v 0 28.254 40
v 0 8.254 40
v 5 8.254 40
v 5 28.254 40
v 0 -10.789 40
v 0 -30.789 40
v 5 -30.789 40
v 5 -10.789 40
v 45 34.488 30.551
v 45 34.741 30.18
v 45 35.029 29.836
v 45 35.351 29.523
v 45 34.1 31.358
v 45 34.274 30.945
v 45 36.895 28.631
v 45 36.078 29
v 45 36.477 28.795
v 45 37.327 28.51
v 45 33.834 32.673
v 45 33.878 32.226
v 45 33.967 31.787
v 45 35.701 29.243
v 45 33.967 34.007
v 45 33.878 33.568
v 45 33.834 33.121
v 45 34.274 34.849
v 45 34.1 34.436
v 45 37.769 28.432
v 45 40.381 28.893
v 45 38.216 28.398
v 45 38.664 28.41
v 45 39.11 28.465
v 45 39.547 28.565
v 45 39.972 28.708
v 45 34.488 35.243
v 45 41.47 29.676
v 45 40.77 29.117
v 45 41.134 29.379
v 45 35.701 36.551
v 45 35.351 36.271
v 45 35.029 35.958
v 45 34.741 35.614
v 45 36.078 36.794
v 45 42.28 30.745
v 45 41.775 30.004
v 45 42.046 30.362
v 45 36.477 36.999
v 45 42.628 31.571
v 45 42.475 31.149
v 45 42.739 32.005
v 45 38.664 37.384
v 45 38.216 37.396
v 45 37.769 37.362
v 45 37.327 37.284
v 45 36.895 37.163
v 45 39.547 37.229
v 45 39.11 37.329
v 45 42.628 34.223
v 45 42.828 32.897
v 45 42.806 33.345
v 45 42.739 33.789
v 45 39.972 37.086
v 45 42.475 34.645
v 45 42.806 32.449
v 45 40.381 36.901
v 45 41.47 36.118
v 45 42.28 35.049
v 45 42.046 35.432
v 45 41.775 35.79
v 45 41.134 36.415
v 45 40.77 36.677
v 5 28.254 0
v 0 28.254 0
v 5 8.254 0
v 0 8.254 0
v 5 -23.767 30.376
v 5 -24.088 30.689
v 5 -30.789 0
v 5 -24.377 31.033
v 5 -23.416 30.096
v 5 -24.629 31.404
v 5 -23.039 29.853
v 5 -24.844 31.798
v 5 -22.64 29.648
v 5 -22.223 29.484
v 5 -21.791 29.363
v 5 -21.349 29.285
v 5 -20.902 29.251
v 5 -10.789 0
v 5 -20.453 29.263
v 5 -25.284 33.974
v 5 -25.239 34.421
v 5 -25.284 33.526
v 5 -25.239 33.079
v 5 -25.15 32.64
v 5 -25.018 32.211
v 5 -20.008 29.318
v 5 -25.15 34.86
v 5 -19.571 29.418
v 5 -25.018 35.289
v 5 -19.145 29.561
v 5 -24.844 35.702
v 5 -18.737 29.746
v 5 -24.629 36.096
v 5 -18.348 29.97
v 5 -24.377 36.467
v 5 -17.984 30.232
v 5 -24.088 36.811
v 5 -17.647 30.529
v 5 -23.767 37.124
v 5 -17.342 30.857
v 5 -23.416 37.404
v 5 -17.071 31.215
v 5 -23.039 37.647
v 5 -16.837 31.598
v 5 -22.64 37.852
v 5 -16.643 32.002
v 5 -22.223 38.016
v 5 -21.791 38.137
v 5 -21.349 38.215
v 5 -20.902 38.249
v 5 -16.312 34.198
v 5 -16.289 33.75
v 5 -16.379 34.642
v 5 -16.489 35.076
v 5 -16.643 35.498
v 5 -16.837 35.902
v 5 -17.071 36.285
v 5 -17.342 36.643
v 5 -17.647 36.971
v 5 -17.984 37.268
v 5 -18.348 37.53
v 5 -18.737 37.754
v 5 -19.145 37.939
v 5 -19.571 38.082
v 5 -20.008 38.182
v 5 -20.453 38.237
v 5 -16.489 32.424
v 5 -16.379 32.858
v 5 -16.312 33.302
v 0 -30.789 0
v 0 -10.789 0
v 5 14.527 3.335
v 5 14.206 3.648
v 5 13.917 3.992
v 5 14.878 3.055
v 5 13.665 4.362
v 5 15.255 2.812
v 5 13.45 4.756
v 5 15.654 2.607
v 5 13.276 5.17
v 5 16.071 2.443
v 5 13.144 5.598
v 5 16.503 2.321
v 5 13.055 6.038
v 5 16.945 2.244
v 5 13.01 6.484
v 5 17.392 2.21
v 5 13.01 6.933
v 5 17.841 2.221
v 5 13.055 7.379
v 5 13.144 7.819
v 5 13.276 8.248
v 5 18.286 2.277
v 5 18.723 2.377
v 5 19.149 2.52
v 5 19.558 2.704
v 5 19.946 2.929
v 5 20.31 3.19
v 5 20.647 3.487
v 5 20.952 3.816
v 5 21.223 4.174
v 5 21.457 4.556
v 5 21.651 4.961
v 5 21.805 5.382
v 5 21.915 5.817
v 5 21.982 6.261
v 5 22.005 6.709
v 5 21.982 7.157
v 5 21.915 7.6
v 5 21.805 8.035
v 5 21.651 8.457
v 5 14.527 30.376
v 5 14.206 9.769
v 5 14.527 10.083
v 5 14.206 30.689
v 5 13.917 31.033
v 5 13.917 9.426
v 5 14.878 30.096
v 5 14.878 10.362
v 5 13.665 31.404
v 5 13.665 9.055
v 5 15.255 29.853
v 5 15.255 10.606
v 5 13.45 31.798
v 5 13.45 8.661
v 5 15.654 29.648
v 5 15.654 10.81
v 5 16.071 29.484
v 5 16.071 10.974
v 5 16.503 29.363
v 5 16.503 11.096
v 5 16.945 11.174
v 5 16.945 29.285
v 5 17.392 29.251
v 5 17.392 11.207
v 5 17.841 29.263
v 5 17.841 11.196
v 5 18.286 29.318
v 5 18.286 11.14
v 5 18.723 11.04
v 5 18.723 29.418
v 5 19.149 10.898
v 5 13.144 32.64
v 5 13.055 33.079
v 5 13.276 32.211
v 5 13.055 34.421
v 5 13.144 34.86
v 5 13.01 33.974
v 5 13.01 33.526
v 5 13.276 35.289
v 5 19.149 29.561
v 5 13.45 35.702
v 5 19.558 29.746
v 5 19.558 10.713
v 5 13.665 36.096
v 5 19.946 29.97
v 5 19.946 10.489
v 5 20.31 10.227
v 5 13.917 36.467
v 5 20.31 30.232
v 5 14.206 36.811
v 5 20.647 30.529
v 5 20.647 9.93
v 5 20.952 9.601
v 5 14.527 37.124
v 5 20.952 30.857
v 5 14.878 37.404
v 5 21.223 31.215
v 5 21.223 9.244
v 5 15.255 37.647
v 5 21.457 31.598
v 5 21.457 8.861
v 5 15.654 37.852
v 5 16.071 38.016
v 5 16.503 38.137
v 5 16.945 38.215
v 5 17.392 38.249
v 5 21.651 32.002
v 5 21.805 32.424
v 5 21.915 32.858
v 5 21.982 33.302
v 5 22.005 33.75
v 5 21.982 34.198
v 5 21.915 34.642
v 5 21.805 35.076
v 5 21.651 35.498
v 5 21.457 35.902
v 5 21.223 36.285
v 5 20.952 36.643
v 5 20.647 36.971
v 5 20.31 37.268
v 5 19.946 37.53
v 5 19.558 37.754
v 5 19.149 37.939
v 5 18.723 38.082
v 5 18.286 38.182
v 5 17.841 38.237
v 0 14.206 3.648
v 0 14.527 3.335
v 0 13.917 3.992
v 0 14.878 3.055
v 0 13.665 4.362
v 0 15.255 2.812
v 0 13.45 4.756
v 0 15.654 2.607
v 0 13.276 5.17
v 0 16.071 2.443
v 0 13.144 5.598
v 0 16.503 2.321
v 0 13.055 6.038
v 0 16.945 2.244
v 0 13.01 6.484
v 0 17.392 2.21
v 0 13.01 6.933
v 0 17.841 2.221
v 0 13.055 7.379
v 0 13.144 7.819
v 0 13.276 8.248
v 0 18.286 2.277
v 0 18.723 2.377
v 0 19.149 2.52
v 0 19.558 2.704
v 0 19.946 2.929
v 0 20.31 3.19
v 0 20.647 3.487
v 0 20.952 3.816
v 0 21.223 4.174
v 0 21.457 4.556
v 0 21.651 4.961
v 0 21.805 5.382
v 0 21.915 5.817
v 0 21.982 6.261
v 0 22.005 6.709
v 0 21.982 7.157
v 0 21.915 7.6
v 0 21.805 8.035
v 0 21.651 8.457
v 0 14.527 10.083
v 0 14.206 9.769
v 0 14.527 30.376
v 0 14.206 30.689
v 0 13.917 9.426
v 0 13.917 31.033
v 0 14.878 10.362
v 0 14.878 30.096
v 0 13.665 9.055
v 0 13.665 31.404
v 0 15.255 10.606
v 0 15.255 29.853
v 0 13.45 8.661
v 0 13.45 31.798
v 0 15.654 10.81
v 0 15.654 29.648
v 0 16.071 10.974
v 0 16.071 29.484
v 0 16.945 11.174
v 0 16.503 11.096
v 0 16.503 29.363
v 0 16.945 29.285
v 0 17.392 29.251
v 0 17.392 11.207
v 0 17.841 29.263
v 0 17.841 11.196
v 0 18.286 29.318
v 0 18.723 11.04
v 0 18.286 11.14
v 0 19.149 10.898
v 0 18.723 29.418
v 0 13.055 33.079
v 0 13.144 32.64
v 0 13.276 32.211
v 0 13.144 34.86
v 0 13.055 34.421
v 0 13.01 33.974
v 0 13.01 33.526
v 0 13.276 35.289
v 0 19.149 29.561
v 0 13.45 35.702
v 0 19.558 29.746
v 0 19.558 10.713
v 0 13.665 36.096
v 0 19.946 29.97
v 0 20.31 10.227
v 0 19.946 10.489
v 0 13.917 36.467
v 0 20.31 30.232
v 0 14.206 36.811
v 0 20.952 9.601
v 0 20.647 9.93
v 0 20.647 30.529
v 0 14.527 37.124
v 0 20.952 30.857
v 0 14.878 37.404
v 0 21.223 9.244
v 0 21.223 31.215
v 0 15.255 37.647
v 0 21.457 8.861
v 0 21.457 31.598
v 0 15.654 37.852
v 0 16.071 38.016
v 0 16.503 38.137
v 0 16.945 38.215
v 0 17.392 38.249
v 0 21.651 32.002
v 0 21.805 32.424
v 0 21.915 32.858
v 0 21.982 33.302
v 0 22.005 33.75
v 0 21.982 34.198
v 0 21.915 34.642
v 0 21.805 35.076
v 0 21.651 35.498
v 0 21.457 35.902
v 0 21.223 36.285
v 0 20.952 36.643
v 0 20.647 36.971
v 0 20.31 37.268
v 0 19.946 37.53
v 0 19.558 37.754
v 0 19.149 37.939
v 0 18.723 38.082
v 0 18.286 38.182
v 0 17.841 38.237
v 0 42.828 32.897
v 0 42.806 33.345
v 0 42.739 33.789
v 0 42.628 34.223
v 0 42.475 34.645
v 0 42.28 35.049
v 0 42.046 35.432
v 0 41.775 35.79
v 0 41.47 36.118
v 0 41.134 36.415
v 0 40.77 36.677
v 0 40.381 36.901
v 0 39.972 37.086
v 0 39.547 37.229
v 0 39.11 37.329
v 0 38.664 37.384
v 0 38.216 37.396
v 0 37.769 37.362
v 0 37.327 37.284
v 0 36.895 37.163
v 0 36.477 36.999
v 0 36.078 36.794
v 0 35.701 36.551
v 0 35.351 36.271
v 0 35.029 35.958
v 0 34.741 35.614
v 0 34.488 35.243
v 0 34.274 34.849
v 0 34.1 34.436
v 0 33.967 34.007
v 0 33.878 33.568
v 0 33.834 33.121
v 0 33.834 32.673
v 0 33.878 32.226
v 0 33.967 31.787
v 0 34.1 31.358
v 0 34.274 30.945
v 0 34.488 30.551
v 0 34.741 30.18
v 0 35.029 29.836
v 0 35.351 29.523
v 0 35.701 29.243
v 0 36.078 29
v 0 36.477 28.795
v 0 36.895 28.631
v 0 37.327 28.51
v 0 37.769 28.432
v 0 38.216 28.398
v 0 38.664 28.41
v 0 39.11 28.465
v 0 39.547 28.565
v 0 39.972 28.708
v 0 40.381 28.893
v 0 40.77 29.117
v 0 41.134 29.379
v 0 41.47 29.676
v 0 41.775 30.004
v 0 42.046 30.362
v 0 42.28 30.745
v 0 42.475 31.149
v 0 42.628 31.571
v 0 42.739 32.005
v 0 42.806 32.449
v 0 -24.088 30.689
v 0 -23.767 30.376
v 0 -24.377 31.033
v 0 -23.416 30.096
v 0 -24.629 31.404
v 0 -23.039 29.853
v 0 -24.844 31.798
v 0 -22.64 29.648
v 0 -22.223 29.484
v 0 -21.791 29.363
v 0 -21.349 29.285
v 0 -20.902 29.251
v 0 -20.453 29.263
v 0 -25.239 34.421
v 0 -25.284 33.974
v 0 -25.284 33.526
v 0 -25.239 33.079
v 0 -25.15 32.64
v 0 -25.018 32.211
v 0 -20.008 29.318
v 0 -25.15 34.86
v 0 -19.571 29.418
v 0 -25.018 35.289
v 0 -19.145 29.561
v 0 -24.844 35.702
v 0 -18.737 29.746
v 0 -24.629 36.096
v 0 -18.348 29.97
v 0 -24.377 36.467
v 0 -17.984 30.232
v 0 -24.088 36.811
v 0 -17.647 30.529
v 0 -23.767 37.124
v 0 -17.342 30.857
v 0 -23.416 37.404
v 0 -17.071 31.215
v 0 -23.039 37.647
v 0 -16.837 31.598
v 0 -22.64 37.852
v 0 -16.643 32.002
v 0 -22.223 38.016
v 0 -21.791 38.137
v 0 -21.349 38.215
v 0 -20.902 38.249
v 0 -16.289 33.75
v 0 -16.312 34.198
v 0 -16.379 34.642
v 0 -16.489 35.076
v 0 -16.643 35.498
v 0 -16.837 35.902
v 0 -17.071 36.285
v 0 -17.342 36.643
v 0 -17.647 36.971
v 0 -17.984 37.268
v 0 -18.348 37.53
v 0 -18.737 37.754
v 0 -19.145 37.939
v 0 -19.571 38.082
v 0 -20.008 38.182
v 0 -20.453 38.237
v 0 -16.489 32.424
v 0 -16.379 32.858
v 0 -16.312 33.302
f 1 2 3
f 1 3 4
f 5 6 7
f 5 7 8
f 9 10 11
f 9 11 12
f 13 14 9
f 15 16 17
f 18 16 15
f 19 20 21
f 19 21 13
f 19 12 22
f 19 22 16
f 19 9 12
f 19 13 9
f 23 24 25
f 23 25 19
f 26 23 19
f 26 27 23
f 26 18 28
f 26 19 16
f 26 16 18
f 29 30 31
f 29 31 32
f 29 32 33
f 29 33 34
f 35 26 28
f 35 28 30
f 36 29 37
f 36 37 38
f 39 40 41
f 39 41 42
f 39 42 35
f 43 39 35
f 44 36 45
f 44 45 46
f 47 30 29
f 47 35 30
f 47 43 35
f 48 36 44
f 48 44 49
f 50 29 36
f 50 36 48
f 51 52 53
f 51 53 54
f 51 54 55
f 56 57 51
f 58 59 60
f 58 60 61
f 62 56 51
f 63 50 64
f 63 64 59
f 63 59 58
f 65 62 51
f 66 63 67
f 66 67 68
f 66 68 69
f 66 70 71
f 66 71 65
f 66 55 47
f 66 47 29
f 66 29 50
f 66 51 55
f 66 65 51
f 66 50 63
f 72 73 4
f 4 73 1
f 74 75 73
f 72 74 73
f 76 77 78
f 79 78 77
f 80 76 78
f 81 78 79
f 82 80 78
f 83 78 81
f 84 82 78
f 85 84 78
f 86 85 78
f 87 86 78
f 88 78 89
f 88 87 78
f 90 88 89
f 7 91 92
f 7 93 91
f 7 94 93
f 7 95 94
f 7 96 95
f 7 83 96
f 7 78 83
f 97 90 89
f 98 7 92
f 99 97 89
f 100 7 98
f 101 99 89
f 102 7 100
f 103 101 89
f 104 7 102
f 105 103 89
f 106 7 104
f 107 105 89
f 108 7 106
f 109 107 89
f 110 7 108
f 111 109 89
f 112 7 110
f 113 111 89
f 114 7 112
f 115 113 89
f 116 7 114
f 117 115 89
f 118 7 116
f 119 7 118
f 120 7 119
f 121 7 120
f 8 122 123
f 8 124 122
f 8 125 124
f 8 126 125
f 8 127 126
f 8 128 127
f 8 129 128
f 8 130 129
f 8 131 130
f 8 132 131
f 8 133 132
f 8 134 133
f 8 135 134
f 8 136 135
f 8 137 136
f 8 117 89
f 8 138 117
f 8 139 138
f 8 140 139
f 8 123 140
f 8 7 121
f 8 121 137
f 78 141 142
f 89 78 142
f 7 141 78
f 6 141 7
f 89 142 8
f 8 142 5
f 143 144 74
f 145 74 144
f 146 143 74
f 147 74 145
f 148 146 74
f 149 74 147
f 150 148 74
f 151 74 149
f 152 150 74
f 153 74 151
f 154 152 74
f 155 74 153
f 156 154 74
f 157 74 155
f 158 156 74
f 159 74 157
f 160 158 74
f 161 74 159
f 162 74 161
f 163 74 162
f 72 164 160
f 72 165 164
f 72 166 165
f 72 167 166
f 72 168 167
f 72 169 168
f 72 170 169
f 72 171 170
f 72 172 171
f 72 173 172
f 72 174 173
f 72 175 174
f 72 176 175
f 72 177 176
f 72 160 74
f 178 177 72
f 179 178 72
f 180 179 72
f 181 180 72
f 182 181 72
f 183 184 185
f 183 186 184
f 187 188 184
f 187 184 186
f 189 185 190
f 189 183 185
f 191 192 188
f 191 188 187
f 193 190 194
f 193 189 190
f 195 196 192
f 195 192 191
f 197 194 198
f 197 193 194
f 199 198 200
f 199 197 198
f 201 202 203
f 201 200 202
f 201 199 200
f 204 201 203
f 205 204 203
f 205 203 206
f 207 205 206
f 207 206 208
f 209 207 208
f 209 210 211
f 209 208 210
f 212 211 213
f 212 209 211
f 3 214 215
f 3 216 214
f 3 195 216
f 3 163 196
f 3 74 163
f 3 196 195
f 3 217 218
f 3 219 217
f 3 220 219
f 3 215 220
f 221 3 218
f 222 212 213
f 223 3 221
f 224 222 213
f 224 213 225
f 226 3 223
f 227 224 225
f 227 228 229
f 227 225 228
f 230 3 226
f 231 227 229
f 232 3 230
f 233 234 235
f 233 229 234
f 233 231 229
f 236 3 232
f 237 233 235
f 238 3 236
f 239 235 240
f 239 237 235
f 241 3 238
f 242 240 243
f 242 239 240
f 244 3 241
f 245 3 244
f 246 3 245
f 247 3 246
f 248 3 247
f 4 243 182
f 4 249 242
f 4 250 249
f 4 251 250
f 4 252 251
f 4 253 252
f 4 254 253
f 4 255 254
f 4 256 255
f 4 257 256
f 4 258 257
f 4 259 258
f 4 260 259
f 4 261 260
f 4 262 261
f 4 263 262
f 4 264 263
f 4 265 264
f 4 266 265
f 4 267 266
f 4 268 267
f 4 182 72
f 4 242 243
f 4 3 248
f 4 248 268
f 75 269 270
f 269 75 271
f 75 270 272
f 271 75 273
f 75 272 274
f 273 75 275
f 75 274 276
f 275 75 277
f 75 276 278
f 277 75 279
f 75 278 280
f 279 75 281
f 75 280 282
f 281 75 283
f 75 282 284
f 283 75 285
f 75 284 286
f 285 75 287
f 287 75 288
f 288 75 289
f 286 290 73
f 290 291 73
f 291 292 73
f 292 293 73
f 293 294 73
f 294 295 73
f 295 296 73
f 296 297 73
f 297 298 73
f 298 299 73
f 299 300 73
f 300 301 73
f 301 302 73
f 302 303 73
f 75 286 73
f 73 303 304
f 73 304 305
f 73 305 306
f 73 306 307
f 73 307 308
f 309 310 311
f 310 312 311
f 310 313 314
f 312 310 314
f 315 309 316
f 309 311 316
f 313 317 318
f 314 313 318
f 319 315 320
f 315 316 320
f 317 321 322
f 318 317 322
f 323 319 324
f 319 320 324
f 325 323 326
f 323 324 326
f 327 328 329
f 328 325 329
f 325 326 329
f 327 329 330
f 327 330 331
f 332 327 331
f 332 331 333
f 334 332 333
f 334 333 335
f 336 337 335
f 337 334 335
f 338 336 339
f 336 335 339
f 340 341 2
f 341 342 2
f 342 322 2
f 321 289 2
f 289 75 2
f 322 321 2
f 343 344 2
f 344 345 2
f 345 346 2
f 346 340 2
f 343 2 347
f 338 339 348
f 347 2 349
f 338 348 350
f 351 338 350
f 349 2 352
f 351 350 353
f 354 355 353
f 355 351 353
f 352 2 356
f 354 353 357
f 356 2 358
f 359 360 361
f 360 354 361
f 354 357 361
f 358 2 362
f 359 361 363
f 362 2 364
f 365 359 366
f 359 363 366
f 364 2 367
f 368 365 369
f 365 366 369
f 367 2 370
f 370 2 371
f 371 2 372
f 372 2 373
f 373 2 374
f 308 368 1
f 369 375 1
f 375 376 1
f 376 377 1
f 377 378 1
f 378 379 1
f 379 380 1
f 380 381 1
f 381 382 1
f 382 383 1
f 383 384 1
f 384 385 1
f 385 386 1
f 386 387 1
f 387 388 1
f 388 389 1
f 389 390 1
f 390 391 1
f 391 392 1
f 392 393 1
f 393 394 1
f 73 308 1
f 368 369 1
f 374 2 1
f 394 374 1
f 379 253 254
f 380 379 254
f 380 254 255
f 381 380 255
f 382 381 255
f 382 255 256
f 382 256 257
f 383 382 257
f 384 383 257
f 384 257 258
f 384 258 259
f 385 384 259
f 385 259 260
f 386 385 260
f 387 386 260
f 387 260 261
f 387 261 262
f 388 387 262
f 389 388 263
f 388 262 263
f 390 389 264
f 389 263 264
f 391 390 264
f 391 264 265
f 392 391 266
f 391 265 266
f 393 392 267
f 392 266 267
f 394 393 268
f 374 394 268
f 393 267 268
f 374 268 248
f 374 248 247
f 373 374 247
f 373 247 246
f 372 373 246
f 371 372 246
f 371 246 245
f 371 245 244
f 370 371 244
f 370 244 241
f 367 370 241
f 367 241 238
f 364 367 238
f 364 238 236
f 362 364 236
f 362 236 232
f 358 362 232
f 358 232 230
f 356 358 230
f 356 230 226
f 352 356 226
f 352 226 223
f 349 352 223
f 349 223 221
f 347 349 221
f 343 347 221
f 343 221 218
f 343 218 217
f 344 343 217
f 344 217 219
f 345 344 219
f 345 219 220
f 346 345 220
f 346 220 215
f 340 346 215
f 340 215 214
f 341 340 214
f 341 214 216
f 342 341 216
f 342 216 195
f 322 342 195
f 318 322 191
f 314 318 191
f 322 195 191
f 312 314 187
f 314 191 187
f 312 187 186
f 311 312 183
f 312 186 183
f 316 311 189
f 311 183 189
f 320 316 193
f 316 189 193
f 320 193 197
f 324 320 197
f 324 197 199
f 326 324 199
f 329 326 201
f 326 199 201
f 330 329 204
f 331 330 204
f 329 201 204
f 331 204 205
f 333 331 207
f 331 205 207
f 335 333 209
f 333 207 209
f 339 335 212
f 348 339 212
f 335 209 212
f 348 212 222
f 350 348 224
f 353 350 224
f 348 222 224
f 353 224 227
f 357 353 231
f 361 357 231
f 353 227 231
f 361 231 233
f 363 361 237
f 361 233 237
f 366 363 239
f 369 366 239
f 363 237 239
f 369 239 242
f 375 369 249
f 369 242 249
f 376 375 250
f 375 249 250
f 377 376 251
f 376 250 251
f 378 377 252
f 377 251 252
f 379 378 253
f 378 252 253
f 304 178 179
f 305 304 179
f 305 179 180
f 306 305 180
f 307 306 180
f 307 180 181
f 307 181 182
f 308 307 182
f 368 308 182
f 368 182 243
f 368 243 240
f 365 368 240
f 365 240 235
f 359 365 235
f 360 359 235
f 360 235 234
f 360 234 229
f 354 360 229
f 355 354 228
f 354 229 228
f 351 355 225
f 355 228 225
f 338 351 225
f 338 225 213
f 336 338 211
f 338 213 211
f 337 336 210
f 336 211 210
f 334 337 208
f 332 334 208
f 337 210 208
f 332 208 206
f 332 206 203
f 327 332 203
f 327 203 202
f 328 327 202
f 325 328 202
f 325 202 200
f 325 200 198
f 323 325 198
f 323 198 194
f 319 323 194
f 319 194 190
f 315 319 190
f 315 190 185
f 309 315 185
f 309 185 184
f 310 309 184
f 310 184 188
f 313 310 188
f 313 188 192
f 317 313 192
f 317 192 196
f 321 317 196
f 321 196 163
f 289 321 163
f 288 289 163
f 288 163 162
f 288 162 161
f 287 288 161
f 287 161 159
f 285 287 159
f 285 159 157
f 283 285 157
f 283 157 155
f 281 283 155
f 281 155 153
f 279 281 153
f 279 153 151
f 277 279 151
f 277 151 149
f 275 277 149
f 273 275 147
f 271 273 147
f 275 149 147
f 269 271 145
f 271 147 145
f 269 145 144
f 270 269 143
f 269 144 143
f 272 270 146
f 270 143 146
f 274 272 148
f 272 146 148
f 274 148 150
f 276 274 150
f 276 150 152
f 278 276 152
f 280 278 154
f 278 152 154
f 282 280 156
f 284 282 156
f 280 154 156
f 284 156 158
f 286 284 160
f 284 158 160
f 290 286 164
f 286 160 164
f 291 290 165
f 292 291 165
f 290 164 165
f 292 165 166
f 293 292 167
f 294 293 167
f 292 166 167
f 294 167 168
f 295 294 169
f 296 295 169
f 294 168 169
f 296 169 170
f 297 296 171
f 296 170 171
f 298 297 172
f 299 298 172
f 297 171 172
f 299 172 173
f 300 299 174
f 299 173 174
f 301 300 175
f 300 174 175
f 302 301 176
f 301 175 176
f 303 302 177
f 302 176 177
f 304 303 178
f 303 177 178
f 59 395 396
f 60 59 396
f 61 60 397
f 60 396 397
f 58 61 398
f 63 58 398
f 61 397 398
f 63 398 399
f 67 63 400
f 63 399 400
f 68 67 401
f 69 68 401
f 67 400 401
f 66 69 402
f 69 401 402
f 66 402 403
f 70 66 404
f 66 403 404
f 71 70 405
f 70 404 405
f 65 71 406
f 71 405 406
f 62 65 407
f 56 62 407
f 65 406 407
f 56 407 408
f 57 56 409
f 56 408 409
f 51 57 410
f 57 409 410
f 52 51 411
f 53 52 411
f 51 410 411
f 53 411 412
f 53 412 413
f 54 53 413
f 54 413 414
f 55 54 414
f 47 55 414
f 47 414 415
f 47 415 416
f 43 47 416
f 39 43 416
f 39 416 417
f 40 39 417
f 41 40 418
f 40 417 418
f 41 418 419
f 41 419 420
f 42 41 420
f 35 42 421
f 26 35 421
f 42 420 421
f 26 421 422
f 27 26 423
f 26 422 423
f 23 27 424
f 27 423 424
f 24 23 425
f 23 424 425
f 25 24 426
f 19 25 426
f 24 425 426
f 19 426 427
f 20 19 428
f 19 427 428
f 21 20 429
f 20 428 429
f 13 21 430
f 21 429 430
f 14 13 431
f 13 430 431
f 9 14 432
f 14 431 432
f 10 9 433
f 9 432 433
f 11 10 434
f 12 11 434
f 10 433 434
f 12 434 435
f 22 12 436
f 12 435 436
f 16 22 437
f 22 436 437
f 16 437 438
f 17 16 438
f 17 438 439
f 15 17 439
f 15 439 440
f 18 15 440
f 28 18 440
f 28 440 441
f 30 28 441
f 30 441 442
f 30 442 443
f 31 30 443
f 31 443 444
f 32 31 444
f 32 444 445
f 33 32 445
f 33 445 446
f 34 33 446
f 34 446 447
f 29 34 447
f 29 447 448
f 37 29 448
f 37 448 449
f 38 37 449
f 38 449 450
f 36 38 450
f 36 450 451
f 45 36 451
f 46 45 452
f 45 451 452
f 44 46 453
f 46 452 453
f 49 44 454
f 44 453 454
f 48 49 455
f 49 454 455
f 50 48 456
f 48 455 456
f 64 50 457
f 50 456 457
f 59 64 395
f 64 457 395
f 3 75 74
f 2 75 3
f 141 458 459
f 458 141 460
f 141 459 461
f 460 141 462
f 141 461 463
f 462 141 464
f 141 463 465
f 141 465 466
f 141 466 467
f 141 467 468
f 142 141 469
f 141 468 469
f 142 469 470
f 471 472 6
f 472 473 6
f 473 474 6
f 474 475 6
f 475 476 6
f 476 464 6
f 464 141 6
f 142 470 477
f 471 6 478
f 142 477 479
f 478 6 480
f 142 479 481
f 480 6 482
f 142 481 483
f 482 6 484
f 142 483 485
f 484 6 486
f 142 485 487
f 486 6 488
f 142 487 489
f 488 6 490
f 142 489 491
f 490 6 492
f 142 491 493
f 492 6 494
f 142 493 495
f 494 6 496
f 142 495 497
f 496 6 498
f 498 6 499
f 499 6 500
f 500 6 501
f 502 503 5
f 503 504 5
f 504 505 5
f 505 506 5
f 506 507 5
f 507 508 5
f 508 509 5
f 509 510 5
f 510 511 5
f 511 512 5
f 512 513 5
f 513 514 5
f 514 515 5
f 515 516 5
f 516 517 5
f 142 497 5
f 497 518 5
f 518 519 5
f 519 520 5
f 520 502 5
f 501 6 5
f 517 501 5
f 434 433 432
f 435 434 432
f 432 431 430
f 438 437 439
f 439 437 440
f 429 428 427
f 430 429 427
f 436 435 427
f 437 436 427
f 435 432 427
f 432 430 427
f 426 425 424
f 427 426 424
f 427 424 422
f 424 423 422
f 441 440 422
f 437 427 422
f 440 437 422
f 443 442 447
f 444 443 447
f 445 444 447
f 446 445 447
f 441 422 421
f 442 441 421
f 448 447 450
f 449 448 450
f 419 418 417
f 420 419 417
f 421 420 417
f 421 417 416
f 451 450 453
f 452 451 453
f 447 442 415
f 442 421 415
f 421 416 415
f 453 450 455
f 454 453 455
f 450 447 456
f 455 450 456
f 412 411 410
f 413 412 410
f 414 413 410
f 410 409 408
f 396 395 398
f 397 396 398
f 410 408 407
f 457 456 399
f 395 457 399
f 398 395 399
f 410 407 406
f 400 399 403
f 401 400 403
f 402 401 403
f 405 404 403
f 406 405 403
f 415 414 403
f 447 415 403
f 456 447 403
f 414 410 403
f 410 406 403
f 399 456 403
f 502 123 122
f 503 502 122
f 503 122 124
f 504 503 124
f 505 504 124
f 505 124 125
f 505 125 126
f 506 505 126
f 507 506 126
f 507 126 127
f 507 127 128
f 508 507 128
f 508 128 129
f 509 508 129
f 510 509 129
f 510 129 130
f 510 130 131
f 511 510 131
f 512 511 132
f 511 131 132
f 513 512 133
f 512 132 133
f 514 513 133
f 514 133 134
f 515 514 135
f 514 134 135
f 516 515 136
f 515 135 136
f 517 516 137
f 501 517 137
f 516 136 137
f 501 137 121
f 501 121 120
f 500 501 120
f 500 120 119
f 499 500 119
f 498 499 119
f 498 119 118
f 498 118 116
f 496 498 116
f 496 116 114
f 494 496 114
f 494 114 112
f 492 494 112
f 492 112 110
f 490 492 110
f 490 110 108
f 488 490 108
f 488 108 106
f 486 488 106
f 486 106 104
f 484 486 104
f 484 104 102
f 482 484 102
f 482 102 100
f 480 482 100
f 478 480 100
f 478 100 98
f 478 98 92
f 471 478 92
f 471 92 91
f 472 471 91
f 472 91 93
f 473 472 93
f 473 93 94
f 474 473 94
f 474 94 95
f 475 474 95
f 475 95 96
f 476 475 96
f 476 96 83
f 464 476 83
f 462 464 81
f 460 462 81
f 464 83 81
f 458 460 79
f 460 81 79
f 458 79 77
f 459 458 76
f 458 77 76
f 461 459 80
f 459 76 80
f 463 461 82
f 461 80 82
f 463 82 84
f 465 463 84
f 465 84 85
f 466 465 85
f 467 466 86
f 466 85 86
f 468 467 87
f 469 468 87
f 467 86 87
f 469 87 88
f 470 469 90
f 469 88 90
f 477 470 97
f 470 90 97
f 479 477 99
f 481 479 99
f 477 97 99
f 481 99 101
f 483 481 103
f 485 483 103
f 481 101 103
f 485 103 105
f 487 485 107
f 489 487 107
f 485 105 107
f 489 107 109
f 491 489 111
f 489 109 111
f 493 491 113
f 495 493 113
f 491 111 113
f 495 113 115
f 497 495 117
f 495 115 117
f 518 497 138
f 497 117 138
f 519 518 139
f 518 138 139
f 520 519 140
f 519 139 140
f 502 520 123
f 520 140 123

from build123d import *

# Parameters (mm, degrees)
F0_W     = 20
F0_H     = 40
F1_DEPTH = 5
F2_R     = 4.5
F3_DEPTH = 30
F4_R     = 4.5
F5_DEPTH = 30
F6_R     = 4.5
F7_DEPTH = 45


with BuildPart() as f1:
    # F0 (on Right) → F1 (new body)
    with BuildSketch(Plane.YZ):
        with Locations((-20.789474, 20)):
            Rectangle(F0_W, F0_H)
        with Locations((18.253966, 20)):
            Rectangle(F0_W, F0_H)
    extrude(amount=F1_DEPTH)

    # F2 (on face) → F3 (cut)
    with BuildSketch(Plane.YZ.offset(5)):
        with Locations((-20.789474, 33.750001)):
            Circle(F2_R)
    extrude(amount=-F3_DEPTH, mode=Mode.SUBTRACT)

    # F4 (on face) → F5 (cut)
    with BuildSketch(Plane.YZ.offset(5)):
        with Locations((17.504556, 33.750001)):
            Circle(F4_R)
        with Locations((17.504556, 6.70864)):
            Circle(F4_R)
    extrude(amount=-F5_DEPTH, mode=Mode.SUBTRACT)


with BuildPart() as f7:
    # F6 (on Right) → F7 (new body)
    with BuildSketch(Plane.YZ):
        with Locations((38.328152, 32.896992)):
            Circle(F6_R)
    extrude(amount=F7_DEPTH)


solid = Compound([f1.part, f7.part])
